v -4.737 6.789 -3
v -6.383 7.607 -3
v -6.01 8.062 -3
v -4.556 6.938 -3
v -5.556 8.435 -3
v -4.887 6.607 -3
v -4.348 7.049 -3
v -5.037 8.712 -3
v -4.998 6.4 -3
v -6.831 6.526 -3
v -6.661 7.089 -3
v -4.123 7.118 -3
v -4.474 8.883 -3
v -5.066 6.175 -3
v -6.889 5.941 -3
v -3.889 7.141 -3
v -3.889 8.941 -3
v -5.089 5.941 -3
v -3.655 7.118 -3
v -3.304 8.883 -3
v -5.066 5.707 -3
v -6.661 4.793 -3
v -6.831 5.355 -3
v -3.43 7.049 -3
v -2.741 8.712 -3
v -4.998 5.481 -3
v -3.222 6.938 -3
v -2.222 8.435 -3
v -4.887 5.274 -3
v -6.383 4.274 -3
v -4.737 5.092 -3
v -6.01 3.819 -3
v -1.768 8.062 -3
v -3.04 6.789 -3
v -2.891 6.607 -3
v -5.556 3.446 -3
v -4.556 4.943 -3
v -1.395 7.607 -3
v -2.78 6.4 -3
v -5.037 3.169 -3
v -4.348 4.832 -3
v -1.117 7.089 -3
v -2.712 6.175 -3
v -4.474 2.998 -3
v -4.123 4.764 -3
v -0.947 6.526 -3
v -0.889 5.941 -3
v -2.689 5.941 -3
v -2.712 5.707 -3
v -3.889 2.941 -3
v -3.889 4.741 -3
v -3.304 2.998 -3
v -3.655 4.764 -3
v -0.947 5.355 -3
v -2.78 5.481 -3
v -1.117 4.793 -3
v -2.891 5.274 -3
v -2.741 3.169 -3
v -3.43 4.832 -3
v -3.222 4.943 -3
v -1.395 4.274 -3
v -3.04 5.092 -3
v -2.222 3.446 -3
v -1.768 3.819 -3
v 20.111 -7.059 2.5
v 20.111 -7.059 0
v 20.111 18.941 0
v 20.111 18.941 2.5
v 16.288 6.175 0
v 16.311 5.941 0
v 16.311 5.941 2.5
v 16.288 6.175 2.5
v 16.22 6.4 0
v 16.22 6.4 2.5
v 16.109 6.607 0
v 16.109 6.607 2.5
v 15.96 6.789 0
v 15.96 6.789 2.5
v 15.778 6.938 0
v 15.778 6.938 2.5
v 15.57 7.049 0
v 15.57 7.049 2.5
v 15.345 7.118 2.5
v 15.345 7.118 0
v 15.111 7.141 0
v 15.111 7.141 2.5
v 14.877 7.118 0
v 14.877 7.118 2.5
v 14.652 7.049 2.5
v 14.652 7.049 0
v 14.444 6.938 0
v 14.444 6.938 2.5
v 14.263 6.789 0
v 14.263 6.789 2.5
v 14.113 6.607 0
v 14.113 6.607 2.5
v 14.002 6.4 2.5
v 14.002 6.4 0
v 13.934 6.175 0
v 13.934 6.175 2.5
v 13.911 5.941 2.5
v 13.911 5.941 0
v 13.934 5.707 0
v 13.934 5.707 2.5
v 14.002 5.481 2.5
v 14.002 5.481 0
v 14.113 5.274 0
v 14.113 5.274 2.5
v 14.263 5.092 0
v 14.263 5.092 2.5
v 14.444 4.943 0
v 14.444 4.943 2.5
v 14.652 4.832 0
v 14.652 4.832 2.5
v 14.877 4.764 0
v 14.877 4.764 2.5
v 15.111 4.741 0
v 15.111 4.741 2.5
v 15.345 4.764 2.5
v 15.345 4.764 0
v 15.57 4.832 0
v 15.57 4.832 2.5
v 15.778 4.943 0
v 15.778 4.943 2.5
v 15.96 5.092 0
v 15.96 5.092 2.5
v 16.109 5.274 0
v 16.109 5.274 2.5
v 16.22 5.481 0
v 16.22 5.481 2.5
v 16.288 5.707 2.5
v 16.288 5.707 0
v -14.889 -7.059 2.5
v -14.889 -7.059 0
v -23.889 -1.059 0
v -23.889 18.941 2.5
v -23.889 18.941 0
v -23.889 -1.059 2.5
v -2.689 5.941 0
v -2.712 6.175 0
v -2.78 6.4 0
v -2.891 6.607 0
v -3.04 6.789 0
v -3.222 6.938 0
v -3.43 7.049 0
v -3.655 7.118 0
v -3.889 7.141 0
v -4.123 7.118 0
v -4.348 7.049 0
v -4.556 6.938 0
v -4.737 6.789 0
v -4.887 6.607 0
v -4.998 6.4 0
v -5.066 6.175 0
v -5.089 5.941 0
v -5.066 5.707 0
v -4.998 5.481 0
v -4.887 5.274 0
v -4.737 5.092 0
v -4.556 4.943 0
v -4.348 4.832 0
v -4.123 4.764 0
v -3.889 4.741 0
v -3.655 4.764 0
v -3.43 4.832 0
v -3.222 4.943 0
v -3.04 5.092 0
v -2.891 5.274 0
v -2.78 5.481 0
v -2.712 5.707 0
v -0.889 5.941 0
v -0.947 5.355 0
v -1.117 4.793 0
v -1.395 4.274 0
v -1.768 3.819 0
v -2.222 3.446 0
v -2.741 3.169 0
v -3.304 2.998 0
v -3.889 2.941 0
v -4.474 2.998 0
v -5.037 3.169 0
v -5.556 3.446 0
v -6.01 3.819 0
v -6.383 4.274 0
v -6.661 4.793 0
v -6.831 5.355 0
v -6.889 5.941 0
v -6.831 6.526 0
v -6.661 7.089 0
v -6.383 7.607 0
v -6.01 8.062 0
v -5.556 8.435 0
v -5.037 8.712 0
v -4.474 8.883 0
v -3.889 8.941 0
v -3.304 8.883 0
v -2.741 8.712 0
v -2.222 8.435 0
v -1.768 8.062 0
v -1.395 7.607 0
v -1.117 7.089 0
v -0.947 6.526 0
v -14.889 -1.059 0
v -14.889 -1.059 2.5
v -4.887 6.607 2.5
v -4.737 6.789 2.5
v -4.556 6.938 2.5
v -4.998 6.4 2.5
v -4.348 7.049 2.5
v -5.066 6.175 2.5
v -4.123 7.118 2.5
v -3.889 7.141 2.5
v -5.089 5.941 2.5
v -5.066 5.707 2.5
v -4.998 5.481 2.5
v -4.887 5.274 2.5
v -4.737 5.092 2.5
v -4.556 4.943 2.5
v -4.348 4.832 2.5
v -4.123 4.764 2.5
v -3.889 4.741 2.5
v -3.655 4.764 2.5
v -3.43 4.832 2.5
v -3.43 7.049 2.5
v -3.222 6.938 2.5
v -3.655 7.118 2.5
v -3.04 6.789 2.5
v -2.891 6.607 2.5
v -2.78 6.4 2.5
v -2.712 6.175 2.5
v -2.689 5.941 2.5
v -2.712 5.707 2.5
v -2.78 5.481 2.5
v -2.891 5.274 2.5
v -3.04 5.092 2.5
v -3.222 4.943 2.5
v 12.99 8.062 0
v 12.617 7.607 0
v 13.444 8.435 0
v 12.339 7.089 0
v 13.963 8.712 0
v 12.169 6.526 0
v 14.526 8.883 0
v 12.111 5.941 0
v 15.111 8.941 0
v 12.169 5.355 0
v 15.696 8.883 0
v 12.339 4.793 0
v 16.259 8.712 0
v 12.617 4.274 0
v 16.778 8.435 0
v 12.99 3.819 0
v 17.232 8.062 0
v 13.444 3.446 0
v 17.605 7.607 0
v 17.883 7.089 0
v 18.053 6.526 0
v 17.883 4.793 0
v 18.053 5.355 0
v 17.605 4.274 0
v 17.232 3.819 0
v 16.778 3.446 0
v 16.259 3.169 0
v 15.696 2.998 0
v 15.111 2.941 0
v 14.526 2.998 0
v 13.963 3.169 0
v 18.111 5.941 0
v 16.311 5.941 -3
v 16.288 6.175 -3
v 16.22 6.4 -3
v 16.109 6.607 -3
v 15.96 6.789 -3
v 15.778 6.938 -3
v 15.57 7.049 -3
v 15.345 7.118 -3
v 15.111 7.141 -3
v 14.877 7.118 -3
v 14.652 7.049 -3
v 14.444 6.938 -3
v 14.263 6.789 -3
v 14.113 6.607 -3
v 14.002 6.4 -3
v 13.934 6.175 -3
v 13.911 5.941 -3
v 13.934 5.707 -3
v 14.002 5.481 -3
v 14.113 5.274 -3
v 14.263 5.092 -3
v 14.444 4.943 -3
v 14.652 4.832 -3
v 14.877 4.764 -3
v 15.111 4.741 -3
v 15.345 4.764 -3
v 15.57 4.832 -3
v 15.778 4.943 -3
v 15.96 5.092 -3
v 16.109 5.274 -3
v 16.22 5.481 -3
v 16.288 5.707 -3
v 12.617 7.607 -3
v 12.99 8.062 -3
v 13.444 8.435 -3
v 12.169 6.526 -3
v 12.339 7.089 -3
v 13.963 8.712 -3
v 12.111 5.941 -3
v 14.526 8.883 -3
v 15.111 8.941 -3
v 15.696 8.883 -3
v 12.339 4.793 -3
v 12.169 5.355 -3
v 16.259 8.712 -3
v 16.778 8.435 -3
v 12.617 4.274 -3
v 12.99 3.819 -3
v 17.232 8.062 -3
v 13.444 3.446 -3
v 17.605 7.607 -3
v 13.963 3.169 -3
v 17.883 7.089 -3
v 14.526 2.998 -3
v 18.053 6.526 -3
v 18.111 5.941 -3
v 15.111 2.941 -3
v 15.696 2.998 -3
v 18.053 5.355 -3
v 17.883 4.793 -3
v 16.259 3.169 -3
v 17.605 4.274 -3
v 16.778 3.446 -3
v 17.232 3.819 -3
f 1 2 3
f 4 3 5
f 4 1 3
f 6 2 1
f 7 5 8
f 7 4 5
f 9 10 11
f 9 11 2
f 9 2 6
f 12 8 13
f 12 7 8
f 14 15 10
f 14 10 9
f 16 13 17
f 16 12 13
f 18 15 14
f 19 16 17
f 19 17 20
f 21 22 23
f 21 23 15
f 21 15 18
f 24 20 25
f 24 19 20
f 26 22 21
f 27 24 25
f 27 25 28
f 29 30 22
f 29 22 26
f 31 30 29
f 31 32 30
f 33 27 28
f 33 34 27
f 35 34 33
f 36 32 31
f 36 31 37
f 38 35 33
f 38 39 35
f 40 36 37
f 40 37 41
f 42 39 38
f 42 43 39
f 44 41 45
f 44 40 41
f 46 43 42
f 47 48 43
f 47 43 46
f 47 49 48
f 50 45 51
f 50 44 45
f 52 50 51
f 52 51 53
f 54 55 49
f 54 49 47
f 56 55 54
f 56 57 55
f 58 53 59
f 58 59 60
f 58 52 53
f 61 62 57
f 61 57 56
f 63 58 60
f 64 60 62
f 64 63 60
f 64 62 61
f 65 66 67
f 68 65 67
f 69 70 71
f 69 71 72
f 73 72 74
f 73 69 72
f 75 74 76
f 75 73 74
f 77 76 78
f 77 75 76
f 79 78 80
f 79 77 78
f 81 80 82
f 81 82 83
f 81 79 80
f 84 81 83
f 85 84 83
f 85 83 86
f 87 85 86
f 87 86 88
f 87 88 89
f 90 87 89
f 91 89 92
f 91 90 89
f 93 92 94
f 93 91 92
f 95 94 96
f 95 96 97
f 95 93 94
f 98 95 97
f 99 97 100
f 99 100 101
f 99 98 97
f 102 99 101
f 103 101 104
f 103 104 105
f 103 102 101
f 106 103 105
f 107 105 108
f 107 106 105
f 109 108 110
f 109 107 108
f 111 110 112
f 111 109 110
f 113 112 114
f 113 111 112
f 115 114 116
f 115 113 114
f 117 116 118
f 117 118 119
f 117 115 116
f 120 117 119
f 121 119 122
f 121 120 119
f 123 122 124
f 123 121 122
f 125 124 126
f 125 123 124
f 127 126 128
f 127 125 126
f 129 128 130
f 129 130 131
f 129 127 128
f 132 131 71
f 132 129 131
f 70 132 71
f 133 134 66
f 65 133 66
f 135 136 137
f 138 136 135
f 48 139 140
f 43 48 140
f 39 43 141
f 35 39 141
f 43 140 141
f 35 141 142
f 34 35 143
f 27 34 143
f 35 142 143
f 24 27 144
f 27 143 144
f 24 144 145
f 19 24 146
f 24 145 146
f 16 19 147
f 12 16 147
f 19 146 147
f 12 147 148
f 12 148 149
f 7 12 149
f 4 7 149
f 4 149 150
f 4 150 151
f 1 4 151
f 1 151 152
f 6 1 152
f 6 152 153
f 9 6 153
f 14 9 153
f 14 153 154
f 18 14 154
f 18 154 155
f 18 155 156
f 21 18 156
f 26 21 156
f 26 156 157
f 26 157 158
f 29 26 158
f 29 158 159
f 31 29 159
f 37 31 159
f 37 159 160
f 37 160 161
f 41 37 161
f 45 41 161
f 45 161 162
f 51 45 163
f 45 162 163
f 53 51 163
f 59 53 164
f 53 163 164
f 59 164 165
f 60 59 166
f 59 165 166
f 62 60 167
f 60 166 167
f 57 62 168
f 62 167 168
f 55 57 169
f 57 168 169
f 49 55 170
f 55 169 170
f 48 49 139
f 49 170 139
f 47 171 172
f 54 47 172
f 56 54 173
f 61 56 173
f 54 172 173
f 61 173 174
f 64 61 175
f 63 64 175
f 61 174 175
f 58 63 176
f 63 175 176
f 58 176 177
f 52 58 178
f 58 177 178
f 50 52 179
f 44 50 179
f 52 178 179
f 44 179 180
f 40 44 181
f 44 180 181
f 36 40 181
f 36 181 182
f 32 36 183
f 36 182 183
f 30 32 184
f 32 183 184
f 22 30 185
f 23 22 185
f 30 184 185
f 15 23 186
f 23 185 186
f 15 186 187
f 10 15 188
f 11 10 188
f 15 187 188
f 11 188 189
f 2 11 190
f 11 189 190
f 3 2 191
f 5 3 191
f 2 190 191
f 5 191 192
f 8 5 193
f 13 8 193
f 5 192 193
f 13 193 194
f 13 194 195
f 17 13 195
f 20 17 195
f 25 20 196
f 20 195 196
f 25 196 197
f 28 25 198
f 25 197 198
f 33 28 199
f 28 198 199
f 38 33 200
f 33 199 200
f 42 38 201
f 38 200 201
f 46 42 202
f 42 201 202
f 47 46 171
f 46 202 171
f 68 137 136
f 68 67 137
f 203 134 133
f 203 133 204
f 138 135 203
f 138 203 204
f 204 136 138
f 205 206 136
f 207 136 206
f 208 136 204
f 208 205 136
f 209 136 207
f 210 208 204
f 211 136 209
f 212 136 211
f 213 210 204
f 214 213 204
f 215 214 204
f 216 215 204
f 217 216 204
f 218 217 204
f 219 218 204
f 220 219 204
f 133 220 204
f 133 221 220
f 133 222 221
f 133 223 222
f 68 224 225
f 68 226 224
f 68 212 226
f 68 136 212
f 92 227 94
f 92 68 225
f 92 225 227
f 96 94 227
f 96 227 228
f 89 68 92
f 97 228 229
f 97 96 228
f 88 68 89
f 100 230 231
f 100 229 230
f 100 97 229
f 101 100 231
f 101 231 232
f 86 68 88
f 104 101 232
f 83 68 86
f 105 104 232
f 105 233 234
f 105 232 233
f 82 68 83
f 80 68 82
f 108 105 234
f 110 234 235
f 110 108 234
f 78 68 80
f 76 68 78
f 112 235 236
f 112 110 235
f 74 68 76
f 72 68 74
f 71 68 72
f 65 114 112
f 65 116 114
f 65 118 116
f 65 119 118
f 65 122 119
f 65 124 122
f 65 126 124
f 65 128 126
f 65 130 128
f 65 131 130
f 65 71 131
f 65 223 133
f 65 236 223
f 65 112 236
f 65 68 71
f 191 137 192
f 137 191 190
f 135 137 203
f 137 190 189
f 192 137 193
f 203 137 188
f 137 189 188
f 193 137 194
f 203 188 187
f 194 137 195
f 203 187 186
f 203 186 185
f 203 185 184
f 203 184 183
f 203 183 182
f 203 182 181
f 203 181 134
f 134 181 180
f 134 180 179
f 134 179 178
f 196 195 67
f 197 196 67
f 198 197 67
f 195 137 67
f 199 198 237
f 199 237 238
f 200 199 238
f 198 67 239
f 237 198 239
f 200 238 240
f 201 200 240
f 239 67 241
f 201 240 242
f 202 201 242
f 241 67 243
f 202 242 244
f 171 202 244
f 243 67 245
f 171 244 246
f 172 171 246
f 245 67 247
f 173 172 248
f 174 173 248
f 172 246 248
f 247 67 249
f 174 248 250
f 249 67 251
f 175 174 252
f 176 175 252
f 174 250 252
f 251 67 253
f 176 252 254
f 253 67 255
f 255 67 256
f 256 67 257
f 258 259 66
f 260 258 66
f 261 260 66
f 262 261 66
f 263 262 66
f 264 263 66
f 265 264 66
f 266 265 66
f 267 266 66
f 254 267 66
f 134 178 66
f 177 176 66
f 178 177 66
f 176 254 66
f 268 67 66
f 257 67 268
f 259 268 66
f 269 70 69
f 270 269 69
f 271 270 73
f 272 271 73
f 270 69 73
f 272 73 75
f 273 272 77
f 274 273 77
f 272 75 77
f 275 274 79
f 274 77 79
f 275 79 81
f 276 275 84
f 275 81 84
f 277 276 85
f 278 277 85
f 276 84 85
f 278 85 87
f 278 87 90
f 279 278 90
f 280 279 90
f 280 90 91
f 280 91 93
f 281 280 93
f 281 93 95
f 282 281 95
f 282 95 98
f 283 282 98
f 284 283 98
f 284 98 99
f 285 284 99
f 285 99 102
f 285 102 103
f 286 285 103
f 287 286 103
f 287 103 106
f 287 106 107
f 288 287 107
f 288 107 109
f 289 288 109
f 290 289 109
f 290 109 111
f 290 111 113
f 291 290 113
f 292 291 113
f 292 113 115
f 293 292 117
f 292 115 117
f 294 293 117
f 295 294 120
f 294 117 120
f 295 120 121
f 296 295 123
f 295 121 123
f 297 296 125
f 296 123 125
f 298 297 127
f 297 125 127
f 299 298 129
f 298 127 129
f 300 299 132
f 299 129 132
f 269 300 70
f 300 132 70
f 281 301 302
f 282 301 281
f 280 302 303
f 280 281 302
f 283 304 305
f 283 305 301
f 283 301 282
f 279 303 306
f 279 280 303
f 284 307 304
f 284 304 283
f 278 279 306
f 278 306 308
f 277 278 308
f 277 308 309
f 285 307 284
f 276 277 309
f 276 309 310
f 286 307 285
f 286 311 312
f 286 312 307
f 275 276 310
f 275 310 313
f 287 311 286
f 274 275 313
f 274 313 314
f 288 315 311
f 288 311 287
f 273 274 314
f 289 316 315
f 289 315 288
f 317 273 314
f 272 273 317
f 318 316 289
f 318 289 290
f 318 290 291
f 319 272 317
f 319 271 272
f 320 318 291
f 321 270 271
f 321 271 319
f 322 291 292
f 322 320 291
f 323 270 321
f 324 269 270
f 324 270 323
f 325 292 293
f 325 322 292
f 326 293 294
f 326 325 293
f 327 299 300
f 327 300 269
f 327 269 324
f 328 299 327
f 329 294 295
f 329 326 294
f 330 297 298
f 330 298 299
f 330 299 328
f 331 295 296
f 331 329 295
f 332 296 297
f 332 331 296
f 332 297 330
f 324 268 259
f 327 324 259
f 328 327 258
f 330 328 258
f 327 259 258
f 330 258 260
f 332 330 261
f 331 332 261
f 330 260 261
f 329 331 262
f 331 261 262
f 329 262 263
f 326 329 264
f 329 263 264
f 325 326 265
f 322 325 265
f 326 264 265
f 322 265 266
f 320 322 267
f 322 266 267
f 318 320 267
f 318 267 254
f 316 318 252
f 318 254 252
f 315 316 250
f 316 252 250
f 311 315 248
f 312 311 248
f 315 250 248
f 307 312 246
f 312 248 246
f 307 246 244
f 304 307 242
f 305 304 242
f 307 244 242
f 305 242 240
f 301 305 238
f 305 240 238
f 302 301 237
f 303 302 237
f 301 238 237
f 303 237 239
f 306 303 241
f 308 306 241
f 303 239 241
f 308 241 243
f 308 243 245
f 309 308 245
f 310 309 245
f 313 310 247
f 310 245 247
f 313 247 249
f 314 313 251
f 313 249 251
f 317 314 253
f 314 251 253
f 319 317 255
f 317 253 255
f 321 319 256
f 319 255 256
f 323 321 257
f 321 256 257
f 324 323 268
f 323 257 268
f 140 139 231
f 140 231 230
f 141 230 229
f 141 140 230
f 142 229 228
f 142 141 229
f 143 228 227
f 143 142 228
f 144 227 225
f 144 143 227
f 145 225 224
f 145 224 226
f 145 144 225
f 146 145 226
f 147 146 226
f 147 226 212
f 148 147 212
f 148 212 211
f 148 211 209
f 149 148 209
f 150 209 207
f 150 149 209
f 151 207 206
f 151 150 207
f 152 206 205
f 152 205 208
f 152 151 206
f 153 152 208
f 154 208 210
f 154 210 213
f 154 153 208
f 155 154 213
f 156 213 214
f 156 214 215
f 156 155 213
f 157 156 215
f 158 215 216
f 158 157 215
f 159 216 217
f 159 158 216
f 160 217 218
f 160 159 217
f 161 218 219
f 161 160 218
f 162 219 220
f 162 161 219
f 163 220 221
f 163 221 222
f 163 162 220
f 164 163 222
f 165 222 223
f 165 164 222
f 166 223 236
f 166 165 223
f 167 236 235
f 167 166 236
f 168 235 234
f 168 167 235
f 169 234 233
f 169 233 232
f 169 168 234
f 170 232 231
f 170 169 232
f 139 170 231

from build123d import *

# Parameters (mm, degrees)
F0_W      = 35
F0_H      = 26
F0_R      = 1.2
F1_DEPTH  = 2.5
F2_R      = 3
F3_DEPTH  = 3
F3_FACE_R = 1.2
F4_DEPTH  = 25
F5_DEPTH  = 25
F6_W      = 20
F6_H      = 2.5
F7_DEPTH  = 9


with BuildPart() as f1:
    # F0 (on Top) → F1 (new body)
    with BuildSketch(Plane.XY):
        with Locations((2.61107, 5.940669)):
            Rectangle(F0_W, F0_H)
        with Locations((-3.88893, 5.940669)):
            Circle(F0_R, mode=Mode.SUBTRACT)
        with Locations((15.11107, 5.940669)):
            Circle(F0_R, mode=Mode.SUBTRACT)
    extrude(amount=F1_DEPTH)

    # F2 (on face) → F3 (join)
    with BuildSketch(Plane(origin=(0, 0, 0), x_dir=(1, 0, 0), z_dir=(0, 0, -1))):
        with Locations((-3.88893, -5.940669)):
            Circle(F2_R)
        with Locations((15.11107, -5.940669)):
            Circle(F2_R)
    extrude(amount=F3_DEPTH)

    # F3_face (on face) → F4 (cut)
    with BuildSketch(Plane(origin=(-3.88893, 5.940669, 0), x_dir=(1, 0, 0), z_dir=(0, 0, 1))):
        Circle(F3_FACE_R)
    extrude(amount=-F4_DEPTH, mode=Mode.SUBTRACT)

    # F3_face (on face) → F5 (cut)
    with BuildSketch(Plane(origin=(-3.88893, 5.940669, 0), x_dir=(1, 0, 0), z_dir=(0, 0, 1))):
        with Locations((19, 0)):
            Circle(F3_FACE_R)
    extrude(amount=-F5_DEPTH, mode=Mode.SUBTRACT)

    # F6 (on face) → F7 (join)
    with BuildSketch(Plane(origin=(-14.88893, 0, 0), x_dir=(0, -1, 0), z_dir=(-1, 0, 0))):
        with Locations((-8.940669, 1.25)):
            Rectangle(F6_W, F6_H)
    extrude(amount=F7_DEPTH)


solid = f1.part
